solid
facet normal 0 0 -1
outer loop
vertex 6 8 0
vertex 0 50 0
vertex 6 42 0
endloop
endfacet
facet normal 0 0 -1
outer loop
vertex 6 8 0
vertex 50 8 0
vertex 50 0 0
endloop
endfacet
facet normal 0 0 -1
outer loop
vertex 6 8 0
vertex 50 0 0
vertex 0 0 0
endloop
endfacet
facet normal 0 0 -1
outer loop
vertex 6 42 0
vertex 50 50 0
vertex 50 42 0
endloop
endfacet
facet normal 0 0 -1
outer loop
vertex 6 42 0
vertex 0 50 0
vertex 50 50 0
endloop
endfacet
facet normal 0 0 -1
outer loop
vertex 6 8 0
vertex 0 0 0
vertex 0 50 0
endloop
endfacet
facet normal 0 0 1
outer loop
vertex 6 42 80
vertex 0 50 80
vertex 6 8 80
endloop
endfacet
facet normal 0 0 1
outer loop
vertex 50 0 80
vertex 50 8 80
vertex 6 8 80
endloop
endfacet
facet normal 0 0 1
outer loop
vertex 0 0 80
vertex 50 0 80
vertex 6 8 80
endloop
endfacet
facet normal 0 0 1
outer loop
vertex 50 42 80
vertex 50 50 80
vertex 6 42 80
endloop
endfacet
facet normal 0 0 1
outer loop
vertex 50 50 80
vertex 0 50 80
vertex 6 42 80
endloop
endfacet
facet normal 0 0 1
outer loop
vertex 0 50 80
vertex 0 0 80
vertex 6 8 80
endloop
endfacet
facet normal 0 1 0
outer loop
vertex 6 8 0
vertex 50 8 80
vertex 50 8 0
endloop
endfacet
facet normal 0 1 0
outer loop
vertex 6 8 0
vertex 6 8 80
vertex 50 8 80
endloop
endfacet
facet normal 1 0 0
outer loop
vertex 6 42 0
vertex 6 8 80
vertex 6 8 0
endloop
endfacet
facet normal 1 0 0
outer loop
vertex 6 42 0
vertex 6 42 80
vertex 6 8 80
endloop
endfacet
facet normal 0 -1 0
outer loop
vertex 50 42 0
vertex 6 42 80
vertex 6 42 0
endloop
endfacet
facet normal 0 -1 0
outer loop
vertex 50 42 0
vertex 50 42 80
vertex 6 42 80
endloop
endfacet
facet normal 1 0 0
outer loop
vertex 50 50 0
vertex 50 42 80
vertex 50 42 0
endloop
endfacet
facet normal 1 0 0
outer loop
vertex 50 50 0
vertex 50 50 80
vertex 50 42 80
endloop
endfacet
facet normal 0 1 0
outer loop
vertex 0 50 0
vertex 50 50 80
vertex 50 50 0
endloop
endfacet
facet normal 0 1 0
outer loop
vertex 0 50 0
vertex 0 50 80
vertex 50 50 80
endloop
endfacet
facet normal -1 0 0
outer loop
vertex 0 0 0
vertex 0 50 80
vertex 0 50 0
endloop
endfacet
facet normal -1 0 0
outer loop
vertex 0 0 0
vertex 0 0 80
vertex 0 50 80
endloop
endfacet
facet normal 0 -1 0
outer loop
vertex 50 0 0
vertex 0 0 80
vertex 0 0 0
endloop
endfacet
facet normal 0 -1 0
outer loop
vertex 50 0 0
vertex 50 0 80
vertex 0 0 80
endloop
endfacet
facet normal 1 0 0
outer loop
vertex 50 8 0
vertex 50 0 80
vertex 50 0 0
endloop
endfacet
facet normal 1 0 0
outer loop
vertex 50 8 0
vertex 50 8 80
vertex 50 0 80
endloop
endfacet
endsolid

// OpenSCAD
$fn = 32;

// ----------------------------------------------------------------------
// Structural section: channel 50 x 50 mm
// ----------------------------------------------------------------------

// --- parameters (mm) ---
sec_w = 50;               // channel width, X
sec_h = 50;               // channel height, Y
flange_t = 8;             // flange thickness
web_t = 6;                // web thickness
plate_t = 80;             // cut length, Z (extrusion height)

profile = [[0, 0], [50, 0], [50, 8], [6, 8], [6, 42], [50, 42], [50, 50], [0, 50]];  // primary outline, 8 points, counter clockwise

// --- the one profile operation ---
linear_extrude(height = plate_t) polygon(points = profile);
